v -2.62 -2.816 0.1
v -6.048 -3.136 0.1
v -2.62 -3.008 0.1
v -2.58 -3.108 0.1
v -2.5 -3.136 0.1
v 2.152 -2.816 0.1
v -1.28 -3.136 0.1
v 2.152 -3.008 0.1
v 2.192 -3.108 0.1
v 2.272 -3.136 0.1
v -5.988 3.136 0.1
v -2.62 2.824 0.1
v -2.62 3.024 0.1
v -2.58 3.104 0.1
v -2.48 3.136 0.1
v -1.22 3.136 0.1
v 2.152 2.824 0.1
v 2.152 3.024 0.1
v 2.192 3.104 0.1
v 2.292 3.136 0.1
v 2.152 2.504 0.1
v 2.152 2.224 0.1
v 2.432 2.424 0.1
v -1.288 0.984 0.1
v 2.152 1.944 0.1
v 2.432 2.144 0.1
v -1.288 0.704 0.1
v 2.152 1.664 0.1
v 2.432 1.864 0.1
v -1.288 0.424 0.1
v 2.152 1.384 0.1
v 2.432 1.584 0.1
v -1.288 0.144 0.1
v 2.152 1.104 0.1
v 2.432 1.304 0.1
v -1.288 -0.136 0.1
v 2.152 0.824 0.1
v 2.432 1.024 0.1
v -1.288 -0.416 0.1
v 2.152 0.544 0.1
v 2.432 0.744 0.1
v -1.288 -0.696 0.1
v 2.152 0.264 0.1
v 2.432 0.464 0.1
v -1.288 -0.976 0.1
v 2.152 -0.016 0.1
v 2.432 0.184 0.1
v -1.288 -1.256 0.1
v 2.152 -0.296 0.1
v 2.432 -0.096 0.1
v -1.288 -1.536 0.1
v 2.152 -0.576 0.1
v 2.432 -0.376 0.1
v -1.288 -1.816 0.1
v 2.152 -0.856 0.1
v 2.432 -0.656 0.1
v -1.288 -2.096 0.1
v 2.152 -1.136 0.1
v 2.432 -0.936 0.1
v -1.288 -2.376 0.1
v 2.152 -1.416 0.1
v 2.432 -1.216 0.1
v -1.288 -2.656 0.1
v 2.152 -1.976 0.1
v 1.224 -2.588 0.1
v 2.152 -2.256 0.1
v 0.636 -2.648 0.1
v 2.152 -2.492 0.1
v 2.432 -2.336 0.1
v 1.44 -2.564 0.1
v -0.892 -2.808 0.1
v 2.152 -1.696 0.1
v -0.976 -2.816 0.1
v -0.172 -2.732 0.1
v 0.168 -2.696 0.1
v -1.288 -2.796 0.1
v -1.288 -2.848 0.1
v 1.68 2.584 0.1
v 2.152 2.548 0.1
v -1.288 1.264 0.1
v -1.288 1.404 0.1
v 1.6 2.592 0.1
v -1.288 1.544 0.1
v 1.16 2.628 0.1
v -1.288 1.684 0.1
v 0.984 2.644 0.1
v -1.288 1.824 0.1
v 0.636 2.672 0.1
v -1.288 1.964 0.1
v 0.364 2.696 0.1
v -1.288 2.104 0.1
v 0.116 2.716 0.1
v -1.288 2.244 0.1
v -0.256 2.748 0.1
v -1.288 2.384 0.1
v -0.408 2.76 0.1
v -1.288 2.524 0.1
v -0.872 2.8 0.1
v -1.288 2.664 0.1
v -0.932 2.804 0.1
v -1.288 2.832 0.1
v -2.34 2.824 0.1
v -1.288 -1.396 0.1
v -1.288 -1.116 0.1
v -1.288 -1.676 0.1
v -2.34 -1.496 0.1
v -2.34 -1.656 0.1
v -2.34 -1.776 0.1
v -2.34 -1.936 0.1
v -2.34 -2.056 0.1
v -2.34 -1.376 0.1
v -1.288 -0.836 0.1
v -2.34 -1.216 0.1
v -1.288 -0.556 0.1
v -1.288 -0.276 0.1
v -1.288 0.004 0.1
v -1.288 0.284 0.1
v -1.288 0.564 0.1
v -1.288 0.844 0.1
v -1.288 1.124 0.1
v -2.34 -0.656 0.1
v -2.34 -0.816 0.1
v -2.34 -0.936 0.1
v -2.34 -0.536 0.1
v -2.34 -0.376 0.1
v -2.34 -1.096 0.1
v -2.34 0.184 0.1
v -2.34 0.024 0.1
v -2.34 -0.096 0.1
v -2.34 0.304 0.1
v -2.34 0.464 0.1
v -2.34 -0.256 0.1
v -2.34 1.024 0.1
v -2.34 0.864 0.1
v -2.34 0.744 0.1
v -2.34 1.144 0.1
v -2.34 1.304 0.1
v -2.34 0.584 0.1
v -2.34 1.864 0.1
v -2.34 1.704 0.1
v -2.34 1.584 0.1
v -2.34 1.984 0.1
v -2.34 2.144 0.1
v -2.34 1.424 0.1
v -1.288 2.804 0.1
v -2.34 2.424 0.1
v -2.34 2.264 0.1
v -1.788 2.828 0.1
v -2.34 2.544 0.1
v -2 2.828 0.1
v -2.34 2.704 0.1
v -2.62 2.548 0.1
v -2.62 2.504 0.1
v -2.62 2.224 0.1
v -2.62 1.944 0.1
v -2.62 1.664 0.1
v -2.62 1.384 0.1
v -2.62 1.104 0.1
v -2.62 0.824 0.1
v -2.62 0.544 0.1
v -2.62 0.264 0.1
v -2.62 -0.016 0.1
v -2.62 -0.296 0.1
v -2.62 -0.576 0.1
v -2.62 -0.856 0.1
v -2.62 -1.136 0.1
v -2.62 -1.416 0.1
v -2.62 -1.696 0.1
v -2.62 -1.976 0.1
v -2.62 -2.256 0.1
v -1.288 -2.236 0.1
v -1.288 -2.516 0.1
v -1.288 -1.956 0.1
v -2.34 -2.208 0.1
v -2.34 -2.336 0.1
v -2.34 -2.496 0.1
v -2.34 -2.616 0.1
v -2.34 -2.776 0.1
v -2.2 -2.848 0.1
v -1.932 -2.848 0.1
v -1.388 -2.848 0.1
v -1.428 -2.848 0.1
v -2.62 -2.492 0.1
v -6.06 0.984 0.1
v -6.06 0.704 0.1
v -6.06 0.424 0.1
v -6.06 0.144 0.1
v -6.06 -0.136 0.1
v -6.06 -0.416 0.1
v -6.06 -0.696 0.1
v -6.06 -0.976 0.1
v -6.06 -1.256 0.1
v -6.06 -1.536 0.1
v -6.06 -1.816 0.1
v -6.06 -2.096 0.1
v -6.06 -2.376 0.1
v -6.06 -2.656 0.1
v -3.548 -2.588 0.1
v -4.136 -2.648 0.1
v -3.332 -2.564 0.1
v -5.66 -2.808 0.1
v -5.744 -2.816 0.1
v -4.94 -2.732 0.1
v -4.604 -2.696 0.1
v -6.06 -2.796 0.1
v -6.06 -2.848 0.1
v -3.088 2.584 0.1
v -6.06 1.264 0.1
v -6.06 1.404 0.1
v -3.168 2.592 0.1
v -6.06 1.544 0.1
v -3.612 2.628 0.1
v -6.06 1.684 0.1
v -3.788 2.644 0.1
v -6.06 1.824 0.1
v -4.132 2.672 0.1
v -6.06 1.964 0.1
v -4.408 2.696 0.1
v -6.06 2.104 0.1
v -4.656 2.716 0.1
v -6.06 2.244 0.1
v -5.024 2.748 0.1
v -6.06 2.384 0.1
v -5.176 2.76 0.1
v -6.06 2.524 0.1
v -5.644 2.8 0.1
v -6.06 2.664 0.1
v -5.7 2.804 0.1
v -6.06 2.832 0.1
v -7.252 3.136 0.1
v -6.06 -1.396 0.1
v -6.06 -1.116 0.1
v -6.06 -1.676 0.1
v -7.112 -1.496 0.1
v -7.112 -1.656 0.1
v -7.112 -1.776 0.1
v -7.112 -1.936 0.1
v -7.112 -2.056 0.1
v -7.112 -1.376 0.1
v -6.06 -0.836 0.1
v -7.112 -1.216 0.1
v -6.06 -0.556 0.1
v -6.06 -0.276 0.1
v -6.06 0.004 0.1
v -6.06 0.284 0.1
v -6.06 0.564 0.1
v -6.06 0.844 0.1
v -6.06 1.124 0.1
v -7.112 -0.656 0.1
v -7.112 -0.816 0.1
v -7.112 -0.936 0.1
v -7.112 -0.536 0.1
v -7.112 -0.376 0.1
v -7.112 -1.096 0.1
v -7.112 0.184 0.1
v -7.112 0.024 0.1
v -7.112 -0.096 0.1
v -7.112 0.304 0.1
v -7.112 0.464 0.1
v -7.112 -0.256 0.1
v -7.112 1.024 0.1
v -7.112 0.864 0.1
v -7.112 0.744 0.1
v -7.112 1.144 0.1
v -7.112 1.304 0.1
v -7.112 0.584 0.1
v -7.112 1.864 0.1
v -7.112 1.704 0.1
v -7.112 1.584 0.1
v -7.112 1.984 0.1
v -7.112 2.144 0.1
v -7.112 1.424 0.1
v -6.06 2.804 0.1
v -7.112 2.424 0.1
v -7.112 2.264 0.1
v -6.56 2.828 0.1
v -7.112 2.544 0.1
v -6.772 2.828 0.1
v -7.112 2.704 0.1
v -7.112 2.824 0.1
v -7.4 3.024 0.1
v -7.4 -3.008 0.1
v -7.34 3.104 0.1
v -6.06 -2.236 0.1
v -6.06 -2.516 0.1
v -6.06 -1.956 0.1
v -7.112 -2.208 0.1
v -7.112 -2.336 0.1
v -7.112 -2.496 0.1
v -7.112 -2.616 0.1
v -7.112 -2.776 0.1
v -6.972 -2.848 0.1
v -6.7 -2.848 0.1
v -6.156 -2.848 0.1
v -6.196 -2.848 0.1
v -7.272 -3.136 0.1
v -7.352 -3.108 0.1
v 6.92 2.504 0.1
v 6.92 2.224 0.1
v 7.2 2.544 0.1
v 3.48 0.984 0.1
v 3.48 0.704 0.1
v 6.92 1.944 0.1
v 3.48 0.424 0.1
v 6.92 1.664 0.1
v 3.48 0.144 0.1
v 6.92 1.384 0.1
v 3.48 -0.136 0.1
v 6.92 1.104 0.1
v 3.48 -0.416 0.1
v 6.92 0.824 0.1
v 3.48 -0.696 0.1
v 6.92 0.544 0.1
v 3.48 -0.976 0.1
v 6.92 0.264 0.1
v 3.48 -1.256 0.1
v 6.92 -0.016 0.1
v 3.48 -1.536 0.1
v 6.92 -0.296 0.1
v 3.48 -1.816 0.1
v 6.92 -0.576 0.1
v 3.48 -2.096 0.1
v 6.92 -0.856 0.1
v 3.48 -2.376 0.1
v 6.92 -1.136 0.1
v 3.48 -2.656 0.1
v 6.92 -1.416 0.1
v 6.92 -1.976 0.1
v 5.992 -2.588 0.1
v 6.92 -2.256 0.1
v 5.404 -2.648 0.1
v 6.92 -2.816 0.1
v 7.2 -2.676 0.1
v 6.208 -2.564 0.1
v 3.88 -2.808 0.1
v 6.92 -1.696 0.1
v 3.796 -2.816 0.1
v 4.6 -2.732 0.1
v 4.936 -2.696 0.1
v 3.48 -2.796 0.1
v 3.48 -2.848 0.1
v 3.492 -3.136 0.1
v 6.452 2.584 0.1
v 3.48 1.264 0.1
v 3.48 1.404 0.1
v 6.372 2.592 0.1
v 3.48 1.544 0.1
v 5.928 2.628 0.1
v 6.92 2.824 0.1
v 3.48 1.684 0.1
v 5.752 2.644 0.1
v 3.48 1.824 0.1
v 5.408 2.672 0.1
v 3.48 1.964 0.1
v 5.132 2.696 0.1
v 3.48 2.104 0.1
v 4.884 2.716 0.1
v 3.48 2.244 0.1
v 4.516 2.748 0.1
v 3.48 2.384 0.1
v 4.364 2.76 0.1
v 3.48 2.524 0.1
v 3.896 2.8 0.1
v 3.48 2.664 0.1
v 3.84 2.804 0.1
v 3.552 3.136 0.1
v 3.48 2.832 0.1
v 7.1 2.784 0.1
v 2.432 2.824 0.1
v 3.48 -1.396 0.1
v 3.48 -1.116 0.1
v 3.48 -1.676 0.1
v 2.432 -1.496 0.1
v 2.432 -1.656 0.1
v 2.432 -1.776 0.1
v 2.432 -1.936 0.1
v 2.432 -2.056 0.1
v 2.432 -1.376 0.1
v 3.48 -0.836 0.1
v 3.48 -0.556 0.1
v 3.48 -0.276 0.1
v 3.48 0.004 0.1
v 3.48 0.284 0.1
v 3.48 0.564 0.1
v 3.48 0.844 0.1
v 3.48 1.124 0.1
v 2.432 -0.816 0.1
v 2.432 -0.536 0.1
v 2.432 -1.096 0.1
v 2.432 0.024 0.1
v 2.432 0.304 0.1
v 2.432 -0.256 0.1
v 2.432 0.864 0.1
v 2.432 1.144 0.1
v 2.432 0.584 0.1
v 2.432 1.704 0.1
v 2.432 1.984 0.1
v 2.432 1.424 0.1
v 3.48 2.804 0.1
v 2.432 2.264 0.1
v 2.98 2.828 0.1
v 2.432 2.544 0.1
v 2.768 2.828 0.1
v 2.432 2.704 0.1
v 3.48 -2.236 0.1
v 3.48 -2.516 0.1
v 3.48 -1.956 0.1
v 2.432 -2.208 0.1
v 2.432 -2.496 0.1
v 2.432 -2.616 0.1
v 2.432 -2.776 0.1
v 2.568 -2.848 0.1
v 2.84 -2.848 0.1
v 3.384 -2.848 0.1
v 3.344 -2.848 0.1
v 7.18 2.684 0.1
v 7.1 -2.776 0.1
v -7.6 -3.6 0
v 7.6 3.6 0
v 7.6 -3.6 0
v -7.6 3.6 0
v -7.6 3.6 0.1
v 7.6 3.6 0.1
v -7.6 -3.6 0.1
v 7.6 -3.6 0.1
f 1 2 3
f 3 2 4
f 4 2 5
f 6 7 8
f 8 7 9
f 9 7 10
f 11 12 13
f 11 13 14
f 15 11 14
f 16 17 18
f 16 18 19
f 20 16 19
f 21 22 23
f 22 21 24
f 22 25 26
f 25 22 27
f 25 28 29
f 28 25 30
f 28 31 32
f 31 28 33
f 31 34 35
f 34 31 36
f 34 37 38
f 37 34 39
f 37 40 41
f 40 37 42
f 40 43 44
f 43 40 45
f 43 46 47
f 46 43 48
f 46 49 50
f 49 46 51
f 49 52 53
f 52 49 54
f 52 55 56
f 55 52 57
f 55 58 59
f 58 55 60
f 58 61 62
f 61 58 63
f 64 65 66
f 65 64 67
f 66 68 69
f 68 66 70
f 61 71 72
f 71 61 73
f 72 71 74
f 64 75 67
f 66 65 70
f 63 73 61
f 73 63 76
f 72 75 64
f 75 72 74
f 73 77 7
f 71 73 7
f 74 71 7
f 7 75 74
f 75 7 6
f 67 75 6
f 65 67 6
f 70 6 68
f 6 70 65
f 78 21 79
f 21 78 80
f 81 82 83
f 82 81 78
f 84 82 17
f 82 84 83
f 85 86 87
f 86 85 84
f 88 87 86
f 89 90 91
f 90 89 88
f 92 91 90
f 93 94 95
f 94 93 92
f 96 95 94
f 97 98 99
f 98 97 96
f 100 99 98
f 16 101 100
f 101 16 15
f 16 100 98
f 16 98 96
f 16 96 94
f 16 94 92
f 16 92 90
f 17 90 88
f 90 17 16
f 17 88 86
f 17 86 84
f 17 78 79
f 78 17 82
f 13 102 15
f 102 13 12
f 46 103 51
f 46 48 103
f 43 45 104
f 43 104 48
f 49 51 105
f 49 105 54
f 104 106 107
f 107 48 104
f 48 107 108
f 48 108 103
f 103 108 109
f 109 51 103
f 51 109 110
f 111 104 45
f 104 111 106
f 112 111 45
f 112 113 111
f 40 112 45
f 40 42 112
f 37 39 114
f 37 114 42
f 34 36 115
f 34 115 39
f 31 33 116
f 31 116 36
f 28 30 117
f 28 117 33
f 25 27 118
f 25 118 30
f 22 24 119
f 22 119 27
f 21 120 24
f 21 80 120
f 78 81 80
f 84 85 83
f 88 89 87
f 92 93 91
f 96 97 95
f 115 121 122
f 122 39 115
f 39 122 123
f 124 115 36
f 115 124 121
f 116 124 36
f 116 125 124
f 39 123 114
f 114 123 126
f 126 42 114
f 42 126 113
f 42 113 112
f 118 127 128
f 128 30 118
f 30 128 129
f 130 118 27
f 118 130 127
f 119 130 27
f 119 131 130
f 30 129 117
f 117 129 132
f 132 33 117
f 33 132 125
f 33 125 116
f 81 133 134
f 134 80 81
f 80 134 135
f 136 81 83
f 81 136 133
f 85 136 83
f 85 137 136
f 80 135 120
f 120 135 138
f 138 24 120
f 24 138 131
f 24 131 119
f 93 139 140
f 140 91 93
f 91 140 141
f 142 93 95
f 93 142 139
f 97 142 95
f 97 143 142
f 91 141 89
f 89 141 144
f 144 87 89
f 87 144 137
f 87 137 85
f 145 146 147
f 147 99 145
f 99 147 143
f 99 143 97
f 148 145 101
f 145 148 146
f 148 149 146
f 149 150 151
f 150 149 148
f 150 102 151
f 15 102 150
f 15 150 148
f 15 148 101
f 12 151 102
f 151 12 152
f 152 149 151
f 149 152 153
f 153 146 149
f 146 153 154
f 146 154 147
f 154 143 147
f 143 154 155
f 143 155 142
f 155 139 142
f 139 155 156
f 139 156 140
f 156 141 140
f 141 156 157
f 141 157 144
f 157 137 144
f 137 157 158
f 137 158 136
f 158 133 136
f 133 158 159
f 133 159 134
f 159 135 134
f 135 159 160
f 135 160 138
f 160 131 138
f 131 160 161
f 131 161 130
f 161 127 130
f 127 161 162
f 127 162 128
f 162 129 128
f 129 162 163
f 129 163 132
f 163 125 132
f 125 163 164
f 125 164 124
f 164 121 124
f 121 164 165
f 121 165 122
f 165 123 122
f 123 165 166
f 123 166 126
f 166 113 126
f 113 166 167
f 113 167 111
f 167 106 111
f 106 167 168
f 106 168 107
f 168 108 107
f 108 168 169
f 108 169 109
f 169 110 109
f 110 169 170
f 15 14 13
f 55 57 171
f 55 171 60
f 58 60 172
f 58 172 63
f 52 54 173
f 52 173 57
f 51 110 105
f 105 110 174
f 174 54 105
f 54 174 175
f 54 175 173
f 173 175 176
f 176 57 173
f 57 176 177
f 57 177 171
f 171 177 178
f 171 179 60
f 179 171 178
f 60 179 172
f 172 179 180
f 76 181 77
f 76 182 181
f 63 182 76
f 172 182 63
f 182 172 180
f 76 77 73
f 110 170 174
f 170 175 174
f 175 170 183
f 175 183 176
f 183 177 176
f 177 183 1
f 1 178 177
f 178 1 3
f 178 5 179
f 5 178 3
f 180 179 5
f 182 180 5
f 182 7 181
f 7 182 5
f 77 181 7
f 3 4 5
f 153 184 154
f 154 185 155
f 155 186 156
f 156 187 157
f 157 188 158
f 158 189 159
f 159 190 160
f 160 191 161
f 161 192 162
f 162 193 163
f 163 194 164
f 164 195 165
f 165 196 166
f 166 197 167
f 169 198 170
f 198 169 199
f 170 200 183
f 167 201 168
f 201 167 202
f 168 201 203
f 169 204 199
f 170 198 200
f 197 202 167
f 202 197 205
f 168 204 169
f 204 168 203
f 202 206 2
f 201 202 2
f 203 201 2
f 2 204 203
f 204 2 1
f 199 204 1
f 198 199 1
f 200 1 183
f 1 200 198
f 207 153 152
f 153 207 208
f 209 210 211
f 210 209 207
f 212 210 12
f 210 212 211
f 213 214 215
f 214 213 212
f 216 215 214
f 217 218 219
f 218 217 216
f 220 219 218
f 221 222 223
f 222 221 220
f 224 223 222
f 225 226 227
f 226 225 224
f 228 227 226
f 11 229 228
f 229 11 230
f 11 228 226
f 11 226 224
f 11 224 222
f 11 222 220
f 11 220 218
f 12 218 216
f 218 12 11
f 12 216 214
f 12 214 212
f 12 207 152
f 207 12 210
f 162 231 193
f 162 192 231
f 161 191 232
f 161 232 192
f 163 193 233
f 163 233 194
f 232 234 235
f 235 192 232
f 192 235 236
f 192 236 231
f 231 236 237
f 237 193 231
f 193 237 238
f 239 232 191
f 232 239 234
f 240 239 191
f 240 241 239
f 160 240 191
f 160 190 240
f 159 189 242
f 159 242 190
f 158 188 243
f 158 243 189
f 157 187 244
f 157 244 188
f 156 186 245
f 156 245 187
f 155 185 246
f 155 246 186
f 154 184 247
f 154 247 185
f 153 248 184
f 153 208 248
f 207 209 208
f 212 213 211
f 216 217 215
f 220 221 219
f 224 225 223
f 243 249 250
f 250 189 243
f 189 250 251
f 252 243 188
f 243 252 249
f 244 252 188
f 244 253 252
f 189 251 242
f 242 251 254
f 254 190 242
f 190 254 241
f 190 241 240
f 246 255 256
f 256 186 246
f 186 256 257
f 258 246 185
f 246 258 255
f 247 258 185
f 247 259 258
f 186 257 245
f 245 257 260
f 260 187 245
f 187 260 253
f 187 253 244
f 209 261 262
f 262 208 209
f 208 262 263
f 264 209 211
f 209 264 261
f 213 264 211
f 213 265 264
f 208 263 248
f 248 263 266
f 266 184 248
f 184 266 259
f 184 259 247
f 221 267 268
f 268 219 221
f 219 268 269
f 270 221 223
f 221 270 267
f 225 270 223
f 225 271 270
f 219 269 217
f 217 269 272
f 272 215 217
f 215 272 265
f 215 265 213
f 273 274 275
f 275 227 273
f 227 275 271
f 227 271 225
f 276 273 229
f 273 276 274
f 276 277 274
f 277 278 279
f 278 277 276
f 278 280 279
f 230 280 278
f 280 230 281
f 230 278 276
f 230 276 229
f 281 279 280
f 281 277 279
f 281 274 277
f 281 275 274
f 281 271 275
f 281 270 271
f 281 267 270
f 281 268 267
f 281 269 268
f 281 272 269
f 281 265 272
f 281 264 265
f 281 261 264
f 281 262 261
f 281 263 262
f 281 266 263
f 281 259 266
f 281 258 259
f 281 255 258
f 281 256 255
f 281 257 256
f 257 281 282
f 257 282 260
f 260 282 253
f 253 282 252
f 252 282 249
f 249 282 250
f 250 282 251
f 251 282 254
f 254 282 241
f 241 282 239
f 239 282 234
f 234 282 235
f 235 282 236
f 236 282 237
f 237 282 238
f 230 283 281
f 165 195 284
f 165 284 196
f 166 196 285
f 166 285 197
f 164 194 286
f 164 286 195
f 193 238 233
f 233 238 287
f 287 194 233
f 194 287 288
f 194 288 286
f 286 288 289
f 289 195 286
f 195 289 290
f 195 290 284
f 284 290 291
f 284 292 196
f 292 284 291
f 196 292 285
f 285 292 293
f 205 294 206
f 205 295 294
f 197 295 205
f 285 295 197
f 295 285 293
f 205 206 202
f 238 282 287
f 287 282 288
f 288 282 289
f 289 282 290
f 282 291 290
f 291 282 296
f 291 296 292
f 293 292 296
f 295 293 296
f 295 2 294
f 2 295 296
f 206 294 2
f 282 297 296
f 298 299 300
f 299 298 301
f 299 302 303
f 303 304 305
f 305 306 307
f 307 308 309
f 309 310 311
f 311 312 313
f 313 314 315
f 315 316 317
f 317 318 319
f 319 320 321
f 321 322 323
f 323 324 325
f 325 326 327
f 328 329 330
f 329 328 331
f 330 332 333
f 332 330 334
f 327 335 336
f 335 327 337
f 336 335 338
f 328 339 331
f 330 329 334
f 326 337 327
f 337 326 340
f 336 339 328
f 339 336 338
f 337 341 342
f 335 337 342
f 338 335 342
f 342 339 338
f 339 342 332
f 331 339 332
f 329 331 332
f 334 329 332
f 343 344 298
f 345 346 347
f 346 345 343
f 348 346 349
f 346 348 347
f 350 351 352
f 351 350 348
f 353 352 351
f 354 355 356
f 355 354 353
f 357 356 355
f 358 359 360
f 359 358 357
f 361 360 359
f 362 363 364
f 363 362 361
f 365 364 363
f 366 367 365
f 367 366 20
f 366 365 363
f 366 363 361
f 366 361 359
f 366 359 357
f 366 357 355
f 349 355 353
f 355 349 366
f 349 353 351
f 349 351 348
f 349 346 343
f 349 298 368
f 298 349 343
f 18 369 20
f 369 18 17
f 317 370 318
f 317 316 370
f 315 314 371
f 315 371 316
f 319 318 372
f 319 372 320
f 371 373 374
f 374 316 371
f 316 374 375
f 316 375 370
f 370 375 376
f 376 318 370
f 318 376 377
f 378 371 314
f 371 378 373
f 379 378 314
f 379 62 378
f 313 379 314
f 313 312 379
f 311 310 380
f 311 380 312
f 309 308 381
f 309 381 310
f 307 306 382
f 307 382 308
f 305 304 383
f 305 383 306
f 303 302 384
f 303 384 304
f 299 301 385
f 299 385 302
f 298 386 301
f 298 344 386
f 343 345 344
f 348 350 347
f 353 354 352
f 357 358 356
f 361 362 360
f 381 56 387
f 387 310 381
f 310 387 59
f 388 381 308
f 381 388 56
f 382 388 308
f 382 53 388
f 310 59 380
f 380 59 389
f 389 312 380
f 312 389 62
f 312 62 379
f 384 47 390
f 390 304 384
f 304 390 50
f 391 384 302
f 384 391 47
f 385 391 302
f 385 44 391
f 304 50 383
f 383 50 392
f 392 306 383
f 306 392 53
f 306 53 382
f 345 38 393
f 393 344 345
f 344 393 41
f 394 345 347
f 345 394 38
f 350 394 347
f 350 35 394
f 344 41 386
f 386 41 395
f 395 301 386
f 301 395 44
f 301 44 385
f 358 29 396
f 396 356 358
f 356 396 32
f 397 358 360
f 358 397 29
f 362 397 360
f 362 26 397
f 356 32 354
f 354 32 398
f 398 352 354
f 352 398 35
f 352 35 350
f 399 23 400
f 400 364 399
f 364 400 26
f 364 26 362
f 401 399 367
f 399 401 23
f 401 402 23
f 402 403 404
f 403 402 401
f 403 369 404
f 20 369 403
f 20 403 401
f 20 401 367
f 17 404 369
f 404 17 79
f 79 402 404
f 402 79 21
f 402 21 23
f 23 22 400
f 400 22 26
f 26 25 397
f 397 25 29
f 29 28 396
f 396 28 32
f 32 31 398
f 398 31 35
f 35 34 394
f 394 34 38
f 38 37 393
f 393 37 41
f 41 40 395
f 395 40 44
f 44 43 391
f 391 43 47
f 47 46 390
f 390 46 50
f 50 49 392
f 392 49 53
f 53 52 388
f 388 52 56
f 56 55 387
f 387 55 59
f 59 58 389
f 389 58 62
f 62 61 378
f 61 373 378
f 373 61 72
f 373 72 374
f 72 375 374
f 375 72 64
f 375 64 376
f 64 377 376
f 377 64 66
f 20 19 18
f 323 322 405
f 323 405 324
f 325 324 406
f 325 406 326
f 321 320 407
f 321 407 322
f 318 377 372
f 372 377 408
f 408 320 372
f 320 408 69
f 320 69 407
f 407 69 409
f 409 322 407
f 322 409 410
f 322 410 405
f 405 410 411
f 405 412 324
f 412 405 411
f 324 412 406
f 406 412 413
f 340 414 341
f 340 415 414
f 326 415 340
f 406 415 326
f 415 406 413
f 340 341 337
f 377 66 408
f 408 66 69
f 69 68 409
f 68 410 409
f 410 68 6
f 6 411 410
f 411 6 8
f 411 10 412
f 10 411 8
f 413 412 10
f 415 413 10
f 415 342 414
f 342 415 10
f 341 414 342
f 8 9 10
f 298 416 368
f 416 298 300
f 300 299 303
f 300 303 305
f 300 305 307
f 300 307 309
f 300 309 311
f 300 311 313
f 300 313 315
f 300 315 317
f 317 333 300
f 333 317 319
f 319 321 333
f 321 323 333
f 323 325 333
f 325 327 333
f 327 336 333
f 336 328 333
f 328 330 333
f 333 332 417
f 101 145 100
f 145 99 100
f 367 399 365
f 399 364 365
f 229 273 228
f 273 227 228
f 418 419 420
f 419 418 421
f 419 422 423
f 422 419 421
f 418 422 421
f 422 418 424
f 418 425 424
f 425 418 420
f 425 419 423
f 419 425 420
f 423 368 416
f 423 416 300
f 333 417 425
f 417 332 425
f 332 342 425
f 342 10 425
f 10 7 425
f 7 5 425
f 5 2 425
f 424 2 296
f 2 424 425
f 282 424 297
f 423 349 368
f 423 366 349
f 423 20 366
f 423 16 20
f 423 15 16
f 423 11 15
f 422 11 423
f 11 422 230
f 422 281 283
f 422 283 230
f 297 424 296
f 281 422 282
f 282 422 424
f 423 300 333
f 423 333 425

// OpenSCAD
use <../lib.scad>
use <../p/box5-12.scad>
use <s/4188571cs02.scad>
function ldraw_lib__4263304g() = [
// 0 Sticker  0.9 x  1.9 with Vertical Vents
// 0 Name: 4263304g.dat
// 0 Author: Gerald Lasser [GeraldLasser]
// 0 !LDRAW_ORG Part UPDATE 2023-04
// 0 !LICENSE Licensed under CC BY 4.0 : see CAreadme.txt
// 
// 0 BFC CERTIFY CCW
  [0,"BFC","CERTIFY"],
  [0,"BFC","CCW"],
// 
// 0 !KEYWORDS BNSF, Bricklink 10133stk01, Brickowl 912944, Rebrickable 53049
// 0 !KEYWORDS Sante Fe, Set 10133
// 
// 0 !HISTORY 2023-08-25 [OrionP] Official Update 2023-04
// 
// 
// 1 16 0 -.25 0 1 0 0 0 1 0 0 0 1 s\4188571cs02.dat
  [1,16,0,-.25,0,1,0,0,0,1,0,0,0,1, ldraw_lib__s__4188571cs02()],
// 
// 1 16 0 -0.25 0 19 0 0 0 0.25 0 0 0 9 box5-12.dat
  [1,16,0,-0.25,0,19,0,0,0,0.25,0,0,0,9, ldraw_lib__box5_12()],
// 
// 3 16 19 -.25 9 17.75 -.25 6.96 17.95 -.25 6.71
  [3,16,19,-.25,9,17.75,-.25,6.96,17.95,-.25,6.71],
// 3 16 19 -.25 9 17.95 -.25 6.71 18 -.25 6.36
  [3,16,19,-.25,9,17.95,-.25,6.71,18,-.25,6.36],
// 3 16 18 -.25 -6.69 17.75 -.25 -6.94 19 -.25 -9
  [3,16,18,-.25,-6.69,17.75,-.25,-6.94,19,-.25,-9],
// 3 16 17.75 -.25 -6.94 17.3 -.25 -7.04 19 -.25 -9
  [3,16,17.75,-.25,-6.94,17.3,-.25,-7.04,19,-.25,-9],
// 3 16 17.3 -.25 -7.04 8.73 -.25 -7.84 19 -.25 -9
  [3,16,17.3,-.25,-7.04,8.73,-.25,-7.84,19,-.25,-9],
// 3 16 8.73 -.25 -7.84 5.68 -.25 -7.84 19 -.25 -9
  [3,16,8.73,-.25,-7.84,5.68,-.25,-7.84,19,-.25,-9],
// 3 16 5.68 -.25 -7.84 -3.2 -.25 -7.84 19 -.25 -9
  [3,16,5.68,-.25,-7.84,-3.2,-.25,-7.84,19,-.25,-9],
// 3 16 -3.2 -.25 -7.84 -6.25 -.25 -7.84 19 -.25 -9
  [3,16,-3.2,-.25,-7.84,-6.25,-.25,-7.84,19,-.25,-9],
// 3 16 -6.25 -.25 -7.84 -15.12 -.25 -7.84 19 -.25 -9
  [3,16,-6.25,-.25,-7.84,-15.12,-.25,-7.84,19,-.25,-9],
// 4 16 19 -.25 -9 -15.12 -.25 -7.84 -18.18 -.25 -7.84 -19 -.25 -9
  [4,16,19,-.25,-9,-15.12,-.25,-7.84,-18.18,-.25,-7.84,-19,-.25,-9],
// 3 16 -18.5 -.25 -7.52 -19 -.25 -9 -18.38 -.25 -7.77
  [3,16,-18.5,-.25,-7.52,-19,-.25,-9,-18.38,-.25,-7.77],
// 3 16 19 -.25 9 17.3 -.25 7.06 17.75 -.25 6.96
  [3,16,19,-.25,9,17.3,-.25,7.06,17.75,-.25,6.96],
// 3 16 19 -.25 9 8.88 -.25 7.84 17.3 -.25 7.06
  [3,16,19,-.25,9,8.88,-.25,7.84,17.3,-.25,7.06],
// 3 16 19 -.25 9 5.73 -.25 7.84 8.88 -.25 7.84
  [3,16,19,-.25,9,5.73,-.25,7.84,8.88,-.25,7.84],
// 3 16 19 -.25 9 -3.05 -.25 7.84 5.73 -.25 7.84
  [3,16,19,-.25,9,-3.05,-.25,7.84,5.73,-.25,7.84],
// 3 16 19 -.25 9 -6.2 -.25 7.84 -3.05 -.25 7.84
  [3,16,19,-.25,9,-6.2,-.25,7.84,-3.05,-.25,7.84],
// 3 16 19 -.25 9 -14.97 -.25 7.84 -6.2 -.25 7.84
  [3,16,19,-.25,9,-14.97,-.25,7.84,-6.2,-.25,7.84],
// 4 16 -18.13 -.25 7.84 -14.97 -.25 7.84 19 -.25 9 -19 -.25 9
  [4,16,-18.13,-.25,7.84,-14.97,-.25,7.84,19,-.25,9,-19,-.25,9],
// 3 16 -19 -.25 9 -18.5 -.25 7.56 -18.35 -.25 7.76
  [3,16,-19,-.25,9,-18.5,-.25,7.56,-18.35,-.25,7.76],
// 3 16 -19 -.25 9 -18.35 -.25 7.76 -18.13 -.25 7.84
  [3,16,-19,-.25,9,-18.35,-.25,7.76,-18.13,-.25,7.84],
// 3 16 -18.38 -.25 -7.77 -19 -.25 -9 -18.18 -.25 -7.84
  [3,16,-18.38,-.25,-7.77,-19,-.25,-9,-18.18,-.25,-7.84],
// 3 16 -18.5 -.25 7.56 -19 -.25 9 -18.5 -.25 -7.52
  [3,16,-18.5,-.25,7.56,-19,-.25,9,-18.5,-.25,-7.52],
// 3 16 -18.5 -.25 -7.52 -19 -.25 9 -19 -.25 -9
  [3,16,-18.5,-.25,-7.52,-19,-.25,9,-19,-.25,-9],
// 3 16 19 -.25 9 18 -.25 6.36 18 -.25 -6.69
  [3,16,19,-.25,9,18,-.25,6.36,18,-.25,-6.69],
// 3 16 19 -.25 9 18 -.25 -6.69 19 -.25 -9
  [3,16,19,-.25,9,18,-.25,-6.69,19,-.25,-9],
];
module ldraw_lib__4263304g(step=0, col=false, unit=2/5, alt=false, line=0.2, solid=!$preview)
    makepoly(ldraw_lib__4263304g(), step=step, col=col, unit=unit, alt=alt, line=line, solid=solid);
ldraw_lib__4263304g(line=0.2);
